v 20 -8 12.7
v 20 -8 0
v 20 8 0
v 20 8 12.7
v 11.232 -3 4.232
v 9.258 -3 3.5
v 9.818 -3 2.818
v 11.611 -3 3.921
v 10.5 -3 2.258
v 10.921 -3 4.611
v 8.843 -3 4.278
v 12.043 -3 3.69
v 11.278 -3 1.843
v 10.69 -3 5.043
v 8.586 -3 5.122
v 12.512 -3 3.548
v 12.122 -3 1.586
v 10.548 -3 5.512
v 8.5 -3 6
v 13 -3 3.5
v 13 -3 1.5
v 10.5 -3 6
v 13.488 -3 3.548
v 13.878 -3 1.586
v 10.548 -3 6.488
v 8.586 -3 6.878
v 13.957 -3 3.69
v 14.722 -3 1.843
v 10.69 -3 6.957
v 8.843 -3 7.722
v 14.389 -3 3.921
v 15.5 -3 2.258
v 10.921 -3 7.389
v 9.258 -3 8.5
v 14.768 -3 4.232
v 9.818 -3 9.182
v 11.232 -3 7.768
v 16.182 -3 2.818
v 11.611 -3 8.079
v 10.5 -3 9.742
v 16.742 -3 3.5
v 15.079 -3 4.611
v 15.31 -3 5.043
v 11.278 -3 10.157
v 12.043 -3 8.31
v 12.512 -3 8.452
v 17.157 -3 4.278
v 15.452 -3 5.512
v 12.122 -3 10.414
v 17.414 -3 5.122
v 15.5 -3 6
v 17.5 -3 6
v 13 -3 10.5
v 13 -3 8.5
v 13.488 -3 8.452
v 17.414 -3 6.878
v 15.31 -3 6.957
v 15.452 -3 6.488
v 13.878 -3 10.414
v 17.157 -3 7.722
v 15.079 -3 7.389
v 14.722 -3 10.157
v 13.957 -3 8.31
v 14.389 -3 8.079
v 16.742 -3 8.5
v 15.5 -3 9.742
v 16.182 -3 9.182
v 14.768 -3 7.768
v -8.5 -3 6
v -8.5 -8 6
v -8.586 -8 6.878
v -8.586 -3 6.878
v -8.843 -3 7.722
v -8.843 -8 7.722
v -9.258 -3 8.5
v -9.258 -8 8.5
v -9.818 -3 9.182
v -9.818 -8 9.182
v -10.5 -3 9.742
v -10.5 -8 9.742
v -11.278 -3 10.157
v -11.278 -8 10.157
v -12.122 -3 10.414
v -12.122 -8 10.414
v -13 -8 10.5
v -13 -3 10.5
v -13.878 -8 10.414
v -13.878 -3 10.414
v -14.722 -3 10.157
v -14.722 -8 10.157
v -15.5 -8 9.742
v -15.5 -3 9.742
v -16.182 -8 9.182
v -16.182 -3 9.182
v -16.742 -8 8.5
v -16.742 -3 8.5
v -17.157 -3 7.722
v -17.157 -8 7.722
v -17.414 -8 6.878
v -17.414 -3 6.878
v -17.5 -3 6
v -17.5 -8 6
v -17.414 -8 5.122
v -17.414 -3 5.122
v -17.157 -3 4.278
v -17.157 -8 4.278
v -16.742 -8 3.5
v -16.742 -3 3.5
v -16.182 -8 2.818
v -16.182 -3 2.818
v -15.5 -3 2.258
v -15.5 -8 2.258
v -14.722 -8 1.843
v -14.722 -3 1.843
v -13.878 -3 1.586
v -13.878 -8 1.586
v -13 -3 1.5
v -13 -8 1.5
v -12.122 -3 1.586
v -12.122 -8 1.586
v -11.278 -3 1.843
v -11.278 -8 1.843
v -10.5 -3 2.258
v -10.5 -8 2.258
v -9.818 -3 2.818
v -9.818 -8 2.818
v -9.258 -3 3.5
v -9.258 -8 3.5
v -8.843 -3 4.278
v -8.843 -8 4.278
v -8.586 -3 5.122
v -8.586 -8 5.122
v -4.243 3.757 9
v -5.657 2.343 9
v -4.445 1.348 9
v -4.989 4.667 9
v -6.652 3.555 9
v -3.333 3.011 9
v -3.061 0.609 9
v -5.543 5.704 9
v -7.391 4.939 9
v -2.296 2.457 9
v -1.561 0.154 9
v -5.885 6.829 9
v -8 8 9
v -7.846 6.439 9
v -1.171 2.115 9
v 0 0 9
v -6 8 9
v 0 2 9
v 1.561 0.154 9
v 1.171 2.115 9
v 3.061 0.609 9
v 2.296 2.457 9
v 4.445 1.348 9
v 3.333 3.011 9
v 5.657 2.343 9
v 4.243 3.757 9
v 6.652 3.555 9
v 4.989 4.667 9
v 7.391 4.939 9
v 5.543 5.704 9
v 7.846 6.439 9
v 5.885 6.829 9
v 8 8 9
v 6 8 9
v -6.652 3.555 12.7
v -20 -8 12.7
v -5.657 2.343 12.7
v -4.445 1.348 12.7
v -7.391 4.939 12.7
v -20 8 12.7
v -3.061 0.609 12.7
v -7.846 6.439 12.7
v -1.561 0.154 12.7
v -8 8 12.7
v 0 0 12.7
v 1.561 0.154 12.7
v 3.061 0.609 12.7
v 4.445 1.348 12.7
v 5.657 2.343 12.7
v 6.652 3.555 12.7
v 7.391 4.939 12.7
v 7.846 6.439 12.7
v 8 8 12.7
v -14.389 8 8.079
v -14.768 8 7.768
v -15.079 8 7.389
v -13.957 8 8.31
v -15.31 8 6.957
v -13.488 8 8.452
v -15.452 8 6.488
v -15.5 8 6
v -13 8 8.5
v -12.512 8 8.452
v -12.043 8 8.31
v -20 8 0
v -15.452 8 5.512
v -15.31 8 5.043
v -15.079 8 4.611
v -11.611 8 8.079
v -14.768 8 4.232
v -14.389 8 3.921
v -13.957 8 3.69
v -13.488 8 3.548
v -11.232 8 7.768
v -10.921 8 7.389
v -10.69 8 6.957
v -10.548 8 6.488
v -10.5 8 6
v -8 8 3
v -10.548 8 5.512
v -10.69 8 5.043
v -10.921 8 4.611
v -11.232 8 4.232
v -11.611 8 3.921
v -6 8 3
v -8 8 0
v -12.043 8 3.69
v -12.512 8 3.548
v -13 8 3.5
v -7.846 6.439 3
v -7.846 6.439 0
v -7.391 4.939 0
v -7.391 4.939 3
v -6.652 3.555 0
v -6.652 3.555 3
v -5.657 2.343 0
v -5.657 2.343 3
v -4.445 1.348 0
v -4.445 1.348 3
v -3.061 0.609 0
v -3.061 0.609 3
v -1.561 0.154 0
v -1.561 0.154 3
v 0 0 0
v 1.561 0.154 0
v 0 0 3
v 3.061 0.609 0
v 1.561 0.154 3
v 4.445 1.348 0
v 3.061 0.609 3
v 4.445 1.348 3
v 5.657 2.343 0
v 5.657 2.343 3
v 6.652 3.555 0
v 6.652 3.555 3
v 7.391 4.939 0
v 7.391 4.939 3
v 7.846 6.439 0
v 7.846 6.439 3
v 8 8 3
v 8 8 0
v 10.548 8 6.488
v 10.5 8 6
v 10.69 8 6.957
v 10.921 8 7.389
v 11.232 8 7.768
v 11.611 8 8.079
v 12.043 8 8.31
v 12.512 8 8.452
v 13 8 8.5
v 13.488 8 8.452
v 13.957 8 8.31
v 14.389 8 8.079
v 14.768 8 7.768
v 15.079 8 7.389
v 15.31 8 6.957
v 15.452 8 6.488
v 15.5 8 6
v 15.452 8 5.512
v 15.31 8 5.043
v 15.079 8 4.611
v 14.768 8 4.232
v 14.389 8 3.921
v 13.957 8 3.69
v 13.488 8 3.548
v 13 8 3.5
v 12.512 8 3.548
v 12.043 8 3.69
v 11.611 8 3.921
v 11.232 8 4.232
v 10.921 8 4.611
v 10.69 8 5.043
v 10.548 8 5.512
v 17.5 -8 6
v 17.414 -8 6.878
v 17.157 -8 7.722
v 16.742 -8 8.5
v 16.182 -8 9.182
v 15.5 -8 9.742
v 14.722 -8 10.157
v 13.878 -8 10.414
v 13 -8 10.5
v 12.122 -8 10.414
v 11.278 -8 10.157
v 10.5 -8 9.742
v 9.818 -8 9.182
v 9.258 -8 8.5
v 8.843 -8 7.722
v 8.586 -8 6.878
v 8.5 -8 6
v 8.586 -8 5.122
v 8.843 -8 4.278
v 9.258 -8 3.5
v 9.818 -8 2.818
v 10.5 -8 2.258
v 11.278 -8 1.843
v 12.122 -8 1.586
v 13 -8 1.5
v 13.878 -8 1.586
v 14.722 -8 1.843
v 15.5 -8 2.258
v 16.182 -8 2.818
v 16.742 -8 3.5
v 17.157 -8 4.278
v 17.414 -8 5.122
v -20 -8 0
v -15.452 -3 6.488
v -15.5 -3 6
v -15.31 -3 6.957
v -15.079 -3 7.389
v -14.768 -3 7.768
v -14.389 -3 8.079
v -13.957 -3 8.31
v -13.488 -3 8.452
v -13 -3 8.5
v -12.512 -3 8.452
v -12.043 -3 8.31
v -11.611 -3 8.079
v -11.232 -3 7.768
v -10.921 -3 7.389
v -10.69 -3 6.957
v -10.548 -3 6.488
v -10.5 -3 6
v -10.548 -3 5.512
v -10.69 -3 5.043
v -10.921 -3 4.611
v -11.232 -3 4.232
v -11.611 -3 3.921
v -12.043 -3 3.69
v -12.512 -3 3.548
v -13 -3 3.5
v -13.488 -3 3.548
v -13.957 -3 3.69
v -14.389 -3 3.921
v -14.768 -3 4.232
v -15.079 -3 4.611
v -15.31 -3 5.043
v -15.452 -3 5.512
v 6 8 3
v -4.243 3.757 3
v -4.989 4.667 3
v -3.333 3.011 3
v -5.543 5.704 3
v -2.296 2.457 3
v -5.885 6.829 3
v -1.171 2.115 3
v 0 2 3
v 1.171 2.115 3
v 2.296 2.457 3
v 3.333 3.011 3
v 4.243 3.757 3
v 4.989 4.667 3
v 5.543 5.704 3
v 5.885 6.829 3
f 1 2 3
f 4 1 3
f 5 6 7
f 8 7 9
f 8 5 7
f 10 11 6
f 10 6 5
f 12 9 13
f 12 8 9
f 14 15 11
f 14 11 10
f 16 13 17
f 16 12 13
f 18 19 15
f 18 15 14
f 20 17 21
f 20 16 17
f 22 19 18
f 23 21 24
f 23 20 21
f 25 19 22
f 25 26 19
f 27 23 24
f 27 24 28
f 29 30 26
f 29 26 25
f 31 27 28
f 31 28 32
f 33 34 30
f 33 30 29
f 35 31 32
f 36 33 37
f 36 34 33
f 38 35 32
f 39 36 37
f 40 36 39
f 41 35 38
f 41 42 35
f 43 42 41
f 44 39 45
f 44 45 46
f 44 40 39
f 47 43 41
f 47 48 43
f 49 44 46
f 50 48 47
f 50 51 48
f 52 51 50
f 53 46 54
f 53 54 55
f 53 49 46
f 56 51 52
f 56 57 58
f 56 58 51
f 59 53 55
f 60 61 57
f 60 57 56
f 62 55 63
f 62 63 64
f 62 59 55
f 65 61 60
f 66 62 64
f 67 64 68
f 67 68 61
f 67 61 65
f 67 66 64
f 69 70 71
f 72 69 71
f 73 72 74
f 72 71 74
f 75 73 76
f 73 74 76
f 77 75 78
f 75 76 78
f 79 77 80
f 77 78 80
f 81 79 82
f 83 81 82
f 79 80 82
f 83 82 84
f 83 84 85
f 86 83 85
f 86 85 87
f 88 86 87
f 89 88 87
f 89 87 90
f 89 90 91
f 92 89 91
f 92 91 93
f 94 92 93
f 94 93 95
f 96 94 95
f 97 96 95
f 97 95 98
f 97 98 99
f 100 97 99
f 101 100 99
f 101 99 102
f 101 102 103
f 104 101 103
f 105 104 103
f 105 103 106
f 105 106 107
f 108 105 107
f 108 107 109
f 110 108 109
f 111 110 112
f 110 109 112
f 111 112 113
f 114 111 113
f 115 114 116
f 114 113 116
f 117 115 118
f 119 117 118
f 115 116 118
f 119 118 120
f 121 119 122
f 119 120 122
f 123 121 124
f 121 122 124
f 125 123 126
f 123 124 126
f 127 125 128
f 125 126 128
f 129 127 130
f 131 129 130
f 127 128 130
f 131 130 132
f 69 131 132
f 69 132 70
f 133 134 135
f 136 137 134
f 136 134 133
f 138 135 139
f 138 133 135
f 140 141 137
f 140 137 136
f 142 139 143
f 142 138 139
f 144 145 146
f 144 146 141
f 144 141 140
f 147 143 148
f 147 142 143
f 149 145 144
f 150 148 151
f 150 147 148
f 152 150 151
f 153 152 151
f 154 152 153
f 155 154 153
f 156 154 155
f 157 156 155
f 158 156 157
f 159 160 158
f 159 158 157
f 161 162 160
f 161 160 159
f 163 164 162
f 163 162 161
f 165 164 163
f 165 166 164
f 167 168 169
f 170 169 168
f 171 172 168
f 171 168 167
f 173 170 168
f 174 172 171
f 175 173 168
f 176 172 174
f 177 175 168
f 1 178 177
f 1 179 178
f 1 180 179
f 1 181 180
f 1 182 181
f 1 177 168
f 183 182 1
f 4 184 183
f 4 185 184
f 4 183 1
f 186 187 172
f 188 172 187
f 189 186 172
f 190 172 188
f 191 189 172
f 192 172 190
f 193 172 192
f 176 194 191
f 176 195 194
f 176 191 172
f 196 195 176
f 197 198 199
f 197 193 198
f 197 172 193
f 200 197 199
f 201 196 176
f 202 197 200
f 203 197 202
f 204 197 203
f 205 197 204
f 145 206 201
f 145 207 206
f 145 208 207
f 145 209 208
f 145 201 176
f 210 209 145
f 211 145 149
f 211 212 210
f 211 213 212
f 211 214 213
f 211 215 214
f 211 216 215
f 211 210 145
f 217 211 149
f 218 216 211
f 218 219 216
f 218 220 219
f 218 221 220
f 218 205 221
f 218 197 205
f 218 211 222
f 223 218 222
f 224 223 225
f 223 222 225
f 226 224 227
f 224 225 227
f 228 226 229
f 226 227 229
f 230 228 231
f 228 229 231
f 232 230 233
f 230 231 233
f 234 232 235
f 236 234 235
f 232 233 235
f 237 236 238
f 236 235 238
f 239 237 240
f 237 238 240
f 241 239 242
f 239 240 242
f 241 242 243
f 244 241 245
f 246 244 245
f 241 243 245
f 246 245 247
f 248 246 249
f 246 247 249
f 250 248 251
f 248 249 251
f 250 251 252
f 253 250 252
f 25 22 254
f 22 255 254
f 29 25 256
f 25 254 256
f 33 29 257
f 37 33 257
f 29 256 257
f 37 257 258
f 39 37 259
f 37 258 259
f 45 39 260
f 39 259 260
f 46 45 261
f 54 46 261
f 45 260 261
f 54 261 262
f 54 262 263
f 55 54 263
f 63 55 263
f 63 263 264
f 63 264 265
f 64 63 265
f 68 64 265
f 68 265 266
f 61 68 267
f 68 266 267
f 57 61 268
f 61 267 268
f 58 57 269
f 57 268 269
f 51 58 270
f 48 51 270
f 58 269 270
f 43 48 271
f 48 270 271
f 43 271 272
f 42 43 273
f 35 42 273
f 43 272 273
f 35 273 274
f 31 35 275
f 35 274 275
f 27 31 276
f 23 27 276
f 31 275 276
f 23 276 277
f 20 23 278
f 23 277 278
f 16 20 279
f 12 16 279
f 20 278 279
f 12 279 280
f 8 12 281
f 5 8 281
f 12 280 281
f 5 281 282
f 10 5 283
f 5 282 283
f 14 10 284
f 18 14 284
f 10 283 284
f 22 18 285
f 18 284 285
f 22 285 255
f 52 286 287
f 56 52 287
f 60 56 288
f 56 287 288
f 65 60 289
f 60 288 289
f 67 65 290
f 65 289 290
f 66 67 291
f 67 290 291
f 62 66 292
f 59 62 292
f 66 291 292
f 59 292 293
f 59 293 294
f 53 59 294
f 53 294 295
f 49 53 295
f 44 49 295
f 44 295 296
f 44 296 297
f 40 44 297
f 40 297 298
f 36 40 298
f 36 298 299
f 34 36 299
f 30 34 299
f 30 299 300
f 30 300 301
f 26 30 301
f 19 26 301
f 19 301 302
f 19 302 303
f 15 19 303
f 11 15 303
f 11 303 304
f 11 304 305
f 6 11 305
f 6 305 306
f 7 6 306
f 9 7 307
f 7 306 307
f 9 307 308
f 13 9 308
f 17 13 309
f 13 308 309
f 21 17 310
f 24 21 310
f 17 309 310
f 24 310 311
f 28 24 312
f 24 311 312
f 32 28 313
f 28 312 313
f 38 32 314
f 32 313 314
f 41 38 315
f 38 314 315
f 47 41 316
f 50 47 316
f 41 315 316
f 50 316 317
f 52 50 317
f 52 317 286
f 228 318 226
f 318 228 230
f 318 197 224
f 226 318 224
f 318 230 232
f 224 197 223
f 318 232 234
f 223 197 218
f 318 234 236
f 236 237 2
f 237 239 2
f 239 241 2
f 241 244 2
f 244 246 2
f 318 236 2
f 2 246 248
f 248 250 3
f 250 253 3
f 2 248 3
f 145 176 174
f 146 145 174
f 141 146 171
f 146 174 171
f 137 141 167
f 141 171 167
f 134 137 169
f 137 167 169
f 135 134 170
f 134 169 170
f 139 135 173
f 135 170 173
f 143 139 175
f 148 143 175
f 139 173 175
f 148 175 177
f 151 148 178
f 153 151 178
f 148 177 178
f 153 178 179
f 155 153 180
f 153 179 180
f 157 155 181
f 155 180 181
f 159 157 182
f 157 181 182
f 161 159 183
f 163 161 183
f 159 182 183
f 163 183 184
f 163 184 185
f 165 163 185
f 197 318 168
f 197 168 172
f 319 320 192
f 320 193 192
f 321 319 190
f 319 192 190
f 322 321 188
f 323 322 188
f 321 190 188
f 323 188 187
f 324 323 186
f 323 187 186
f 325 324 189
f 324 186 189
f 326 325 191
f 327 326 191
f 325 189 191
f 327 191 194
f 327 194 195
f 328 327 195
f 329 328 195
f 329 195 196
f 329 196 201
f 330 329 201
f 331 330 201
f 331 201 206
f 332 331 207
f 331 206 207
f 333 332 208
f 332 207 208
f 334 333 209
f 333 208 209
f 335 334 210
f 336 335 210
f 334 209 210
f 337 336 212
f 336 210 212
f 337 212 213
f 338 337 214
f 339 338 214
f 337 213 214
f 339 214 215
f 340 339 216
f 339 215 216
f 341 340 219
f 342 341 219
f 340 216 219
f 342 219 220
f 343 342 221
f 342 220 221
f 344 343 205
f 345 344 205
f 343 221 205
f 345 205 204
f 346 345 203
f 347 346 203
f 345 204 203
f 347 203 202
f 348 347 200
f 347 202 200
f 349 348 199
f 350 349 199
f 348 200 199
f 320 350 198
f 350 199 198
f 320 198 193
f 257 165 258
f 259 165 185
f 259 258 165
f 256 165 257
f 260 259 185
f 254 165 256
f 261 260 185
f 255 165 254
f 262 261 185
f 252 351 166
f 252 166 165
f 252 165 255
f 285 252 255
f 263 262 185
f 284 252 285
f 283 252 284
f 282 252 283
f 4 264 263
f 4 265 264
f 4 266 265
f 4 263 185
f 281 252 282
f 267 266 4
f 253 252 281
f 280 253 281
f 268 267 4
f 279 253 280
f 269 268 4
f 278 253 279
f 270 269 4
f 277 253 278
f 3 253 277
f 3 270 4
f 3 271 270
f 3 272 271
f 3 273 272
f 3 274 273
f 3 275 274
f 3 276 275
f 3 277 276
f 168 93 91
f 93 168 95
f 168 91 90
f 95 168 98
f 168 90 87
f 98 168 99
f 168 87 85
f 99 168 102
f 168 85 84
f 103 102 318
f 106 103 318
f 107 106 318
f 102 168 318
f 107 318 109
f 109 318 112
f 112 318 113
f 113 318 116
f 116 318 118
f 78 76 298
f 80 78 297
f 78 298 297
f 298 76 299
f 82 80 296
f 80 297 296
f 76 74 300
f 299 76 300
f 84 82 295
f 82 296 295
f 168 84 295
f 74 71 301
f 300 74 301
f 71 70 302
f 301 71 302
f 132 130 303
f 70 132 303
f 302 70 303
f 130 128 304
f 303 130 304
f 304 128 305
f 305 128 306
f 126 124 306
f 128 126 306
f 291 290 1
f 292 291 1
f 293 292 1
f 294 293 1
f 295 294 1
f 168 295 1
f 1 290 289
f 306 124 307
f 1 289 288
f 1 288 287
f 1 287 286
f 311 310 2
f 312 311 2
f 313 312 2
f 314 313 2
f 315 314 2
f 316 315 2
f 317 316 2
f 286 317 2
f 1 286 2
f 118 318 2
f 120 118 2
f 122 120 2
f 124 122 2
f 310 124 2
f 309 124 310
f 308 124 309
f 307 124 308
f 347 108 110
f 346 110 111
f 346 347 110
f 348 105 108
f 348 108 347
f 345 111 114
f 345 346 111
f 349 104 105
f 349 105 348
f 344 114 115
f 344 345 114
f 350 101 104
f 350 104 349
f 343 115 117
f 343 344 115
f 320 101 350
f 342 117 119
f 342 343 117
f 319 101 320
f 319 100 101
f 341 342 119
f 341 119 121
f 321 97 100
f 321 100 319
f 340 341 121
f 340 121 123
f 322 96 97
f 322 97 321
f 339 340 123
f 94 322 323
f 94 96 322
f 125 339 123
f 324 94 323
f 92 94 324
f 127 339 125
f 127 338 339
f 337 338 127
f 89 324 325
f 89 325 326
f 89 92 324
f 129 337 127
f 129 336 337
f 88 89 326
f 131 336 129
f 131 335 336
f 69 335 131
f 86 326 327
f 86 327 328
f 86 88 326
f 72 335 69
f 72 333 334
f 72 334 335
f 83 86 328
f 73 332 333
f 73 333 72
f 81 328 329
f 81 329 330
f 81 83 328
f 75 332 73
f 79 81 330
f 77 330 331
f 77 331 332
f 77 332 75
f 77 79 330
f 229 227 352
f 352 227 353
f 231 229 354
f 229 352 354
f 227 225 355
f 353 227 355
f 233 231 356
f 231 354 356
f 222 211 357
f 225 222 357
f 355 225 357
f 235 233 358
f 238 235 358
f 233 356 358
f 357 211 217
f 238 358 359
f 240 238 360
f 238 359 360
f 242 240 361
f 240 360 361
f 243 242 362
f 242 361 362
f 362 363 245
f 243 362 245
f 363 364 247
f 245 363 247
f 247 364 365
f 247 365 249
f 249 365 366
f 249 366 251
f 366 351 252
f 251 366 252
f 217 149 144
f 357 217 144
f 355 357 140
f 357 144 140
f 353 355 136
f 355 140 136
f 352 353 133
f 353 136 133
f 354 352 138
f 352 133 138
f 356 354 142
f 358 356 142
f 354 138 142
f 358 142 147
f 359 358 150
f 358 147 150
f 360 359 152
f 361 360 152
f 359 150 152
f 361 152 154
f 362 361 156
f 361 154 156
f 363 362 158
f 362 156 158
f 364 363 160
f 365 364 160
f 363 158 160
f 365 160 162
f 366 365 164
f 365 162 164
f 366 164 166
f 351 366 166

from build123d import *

# Parameters (mm, degrees)
F0_W           = 40
F0_H           = 16
F1_DEPTH       = 12.7
F3_DEPTH       = 3.7
F4_R           = 6
F5_DEPTH       = 6
F6_R           = 8
F7_DEPTH       = 3
F9_D           = 5
F9_CBORE_D     = 9
F9_CBORE_DEPTH = 5


with BuildPart() as f1:
    # F0 (on Top) → F1 (new body)
    with BuildSketch(Plane.XY):
        Rectangle(F0_W, F0_H)
    extrude(amount=F1_DEPTH)

    # F2 (on face) → F3 (cut)
    with BuildSketch(Plane.XY.offset(12.7)):
        with BuildLine():
            ThreePointArc((-8, 8), (0, 0), (8, 8))
            Line((8, 8), (-8, 8))
        make_face()
    extrude(amount=-F3_DEPTH, mode=Mode.SUBTRACT)

    # F4 (on face) → F5 (cut)
    with BuildSketch(Plane.XY.offset(9)):
        with Locations((0, 8)):
            Circle(F4_R)
    extrude(amount=-F5_DEPTH, mode=Mode.SUBTRACT)

    # F6 (on face) → F7 (cut)
    with BuildSketch(Plane.XY.offset(3)):
        with Locations((0, 8)):
            Circle(F6_R)
    extrude(amount=-F7_DEPTH, mode=Mode.SUBTRACT)

    # F9 (through all)
    with Locations(Plane.XZ.offset(8)):
        with Locations((-13, 6), (13, 6)):
            CounterBoreHole(F9_D / 2, F9_CBORE_D / 2, F9_CBORE_DEPTH)


solid = f1.part
